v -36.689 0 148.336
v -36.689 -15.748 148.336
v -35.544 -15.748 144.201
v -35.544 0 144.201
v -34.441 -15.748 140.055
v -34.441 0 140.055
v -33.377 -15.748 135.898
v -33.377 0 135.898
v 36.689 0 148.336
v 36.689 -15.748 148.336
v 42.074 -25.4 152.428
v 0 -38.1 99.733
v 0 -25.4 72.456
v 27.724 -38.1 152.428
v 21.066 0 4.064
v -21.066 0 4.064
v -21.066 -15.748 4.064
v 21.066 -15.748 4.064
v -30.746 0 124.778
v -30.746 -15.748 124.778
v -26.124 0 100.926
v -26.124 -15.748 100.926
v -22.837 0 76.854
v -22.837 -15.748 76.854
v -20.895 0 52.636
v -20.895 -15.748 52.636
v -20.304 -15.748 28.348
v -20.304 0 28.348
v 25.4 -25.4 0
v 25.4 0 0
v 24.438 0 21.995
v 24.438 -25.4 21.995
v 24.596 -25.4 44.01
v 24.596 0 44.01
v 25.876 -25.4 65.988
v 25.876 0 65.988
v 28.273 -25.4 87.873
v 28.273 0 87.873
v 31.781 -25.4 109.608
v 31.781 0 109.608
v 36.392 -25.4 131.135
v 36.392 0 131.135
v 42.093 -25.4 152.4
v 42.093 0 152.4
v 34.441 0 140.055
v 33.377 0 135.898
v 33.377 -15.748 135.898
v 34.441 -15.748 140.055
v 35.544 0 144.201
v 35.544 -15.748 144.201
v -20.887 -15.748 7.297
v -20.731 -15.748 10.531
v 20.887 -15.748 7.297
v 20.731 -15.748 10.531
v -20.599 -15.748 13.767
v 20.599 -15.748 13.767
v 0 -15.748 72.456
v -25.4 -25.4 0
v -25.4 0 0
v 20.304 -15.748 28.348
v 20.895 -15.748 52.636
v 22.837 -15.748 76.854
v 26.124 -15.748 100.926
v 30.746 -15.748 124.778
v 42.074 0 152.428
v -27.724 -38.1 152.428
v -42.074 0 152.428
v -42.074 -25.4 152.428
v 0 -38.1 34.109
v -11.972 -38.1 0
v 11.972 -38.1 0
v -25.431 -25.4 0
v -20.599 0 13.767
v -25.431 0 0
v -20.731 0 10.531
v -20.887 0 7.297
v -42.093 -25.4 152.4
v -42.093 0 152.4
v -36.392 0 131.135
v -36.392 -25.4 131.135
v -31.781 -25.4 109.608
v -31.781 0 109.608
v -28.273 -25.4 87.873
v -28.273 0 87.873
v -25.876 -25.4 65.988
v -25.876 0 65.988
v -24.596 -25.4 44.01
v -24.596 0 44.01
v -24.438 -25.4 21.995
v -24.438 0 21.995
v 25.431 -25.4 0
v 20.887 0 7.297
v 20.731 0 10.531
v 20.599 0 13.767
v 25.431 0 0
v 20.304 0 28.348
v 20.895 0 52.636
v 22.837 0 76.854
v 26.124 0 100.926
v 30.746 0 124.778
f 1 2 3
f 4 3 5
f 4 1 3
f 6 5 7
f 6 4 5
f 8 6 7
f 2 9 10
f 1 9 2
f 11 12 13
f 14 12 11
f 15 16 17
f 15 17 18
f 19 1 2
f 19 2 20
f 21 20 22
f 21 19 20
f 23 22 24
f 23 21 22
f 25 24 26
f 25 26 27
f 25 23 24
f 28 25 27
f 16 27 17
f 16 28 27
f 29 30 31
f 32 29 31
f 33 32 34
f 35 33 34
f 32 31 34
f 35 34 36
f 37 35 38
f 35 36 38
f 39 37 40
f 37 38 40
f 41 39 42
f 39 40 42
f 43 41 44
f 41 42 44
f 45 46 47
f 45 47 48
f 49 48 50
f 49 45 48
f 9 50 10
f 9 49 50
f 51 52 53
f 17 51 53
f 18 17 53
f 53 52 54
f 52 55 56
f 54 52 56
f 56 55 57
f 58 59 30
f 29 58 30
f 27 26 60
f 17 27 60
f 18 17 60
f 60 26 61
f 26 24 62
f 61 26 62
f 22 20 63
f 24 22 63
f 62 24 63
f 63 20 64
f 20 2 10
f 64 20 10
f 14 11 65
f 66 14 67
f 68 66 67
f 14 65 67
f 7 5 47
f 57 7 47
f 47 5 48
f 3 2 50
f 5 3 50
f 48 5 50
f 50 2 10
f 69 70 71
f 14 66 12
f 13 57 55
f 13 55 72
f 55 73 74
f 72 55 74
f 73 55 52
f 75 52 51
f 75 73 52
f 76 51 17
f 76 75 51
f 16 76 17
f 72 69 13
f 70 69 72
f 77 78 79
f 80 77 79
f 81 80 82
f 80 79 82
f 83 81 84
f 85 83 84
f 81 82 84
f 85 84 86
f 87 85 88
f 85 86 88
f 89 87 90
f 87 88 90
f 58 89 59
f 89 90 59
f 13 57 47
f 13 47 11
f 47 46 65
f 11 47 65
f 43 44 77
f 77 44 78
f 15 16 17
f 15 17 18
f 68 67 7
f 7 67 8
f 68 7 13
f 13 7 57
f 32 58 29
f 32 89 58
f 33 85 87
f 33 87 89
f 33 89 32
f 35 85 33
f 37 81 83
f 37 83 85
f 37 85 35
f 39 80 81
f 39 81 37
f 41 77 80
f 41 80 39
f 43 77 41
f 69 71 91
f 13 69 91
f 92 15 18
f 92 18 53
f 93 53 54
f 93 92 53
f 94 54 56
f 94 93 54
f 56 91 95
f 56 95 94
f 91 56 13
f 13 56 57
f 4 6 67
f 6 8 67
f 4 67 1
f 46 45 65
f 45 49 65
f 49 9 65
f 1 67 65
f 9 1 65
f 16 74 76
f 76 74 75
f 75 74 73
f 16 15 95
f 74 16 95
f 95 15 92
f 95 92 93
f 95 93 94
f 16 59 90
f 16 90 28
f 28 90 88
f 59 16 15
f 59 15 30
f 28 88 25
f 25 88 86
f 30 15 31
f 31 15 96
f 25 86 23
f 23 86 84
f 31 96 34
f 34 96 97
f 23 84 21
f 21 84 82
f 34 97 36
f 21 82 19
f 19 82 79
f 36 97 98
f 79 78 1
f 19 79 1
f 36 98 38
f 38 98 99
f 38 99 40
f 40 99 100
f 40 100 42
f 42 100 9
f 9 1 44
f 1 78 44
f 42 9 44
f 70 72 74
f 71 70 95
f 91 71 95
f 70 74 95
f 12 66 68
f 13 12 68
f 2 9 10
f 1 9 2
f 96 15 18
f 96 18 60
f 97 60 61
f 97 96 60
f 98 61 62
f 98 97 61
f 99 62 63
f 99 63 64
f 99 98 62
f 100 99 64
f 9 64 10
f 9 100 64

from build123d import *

# Parameters (mm, degrees)
F2_DEPTH  = 25.4
F3_DEPTH  = 38.1
F4_SIZE   = 12.7
F4_2_SIZE = 12.7
F6_DEPTH  = 15.748


with BuildPart() as f2:
    # F0 (on Front) → F2 (new body)
    with BuildSketch(Plane.XZ):
        with BuildLine():
            Line((-25.4, 0), (0, 0))
            Line((0, 0), (25.4, 0))
            ThreePointArc((25.4, 0), (26.9350814035, 76.9460667381), (42.0928390439, 152.4))
            Line((42.0928390439, 152.4), (0, 152.4))
            Line((0, 152.4), (-42.0928390439, 152.4))
            ThreePointArc((-42.0928390439, 152.4), (-26.9350814035, 76.9460667381), (-25.4, 0))
        make_face()
    extrude(amount=F2_DEPTH)


with BuildPart() as f3:
    # F1 (on Front) → F3 (new body)
    with BuildSketch(Plane.XZ):
        Polygon((42.0741848648, 152.4278223515), (-42.0741848648, 152.4278223515), (0, 72.4563598633), align=None)
    extrude(amount=F3_DEPTH)

    # F4
    f4_edges = [f3.edges().sort_by_distance(p)[0] for p in [
        (-21.037092, -38.1, 112.442091),
        (21.037092, -38.1, 112.442091),
    ]]
    chamfer(f4_edges, length=F4_SIZE)


with BuildPart() as f3b:
    # F1 (on Front) → F3, piece 2 (new body)
    with BuildSketch(Plane.XZ):
        Polygon((25.4312567413, 0), (0, 72.4563598633), (-25.4312567413, 0), align=None)
    extrude(amount=F3_DEPTH)

    # F4#2
    f4_2_edges = [f3b.edges().sort_by_distance(p)[0] for p in [
        (-12.715628, -38.1, 36.22818),
        (12.715628, -38.1, 36.22818),
    ]]
    chamfer(f4_2_edges, length=F4_2_SIZE)


with BuildPart() as f6_tool:
    # F5 (on face) → F6 (new body)
    with BuildSketch(Plane.XZ):
        with BuildLine():
            Line((36.6889990651, 148.3359999431), (0, 148.3359999431))
            Line((0, 148.3359999431), (-36.6889990651, 148.3359999431))
            ThreePointArc((-36.6889990651, 148.3359999431), (-22.8370367883, 76.8541167958), (-21.0663357049, 4.0640000569))
            Line((-21.0663357049, 4.0640000569), (0, 4.0640000569))
            Line((0, 4.0640000569), (21.0663357049, 4.0640000569))
            ThreePointArc((21.0663357049, 4.0640000569), (22.8370367883, 76.8541167958), (36.6889990651, 148.3359999431))
        make_face()
    extrude(amount=F6_DEPTH)


with BuildPart() as f2_1:
    add(f2.part)

    # F6: cut by f6_tool
    add(f6_tool.part, mode=Mode.SUBTRACT)


with BuildPart() as f3_1:
    add(f3.part)

    # F6: cut by f6_tool
    add(f6_tool.part, mode=Mode.SUBTRACT)


with BuildPart() as f3b_1:
    add(f3b.part)

    # F6: cut by f6_tool
    add(f6_tool.part, mode=Mode.SUBTRACT)


solid = Compound([f2_1.part, f3_1.part, f3b_1.part])
